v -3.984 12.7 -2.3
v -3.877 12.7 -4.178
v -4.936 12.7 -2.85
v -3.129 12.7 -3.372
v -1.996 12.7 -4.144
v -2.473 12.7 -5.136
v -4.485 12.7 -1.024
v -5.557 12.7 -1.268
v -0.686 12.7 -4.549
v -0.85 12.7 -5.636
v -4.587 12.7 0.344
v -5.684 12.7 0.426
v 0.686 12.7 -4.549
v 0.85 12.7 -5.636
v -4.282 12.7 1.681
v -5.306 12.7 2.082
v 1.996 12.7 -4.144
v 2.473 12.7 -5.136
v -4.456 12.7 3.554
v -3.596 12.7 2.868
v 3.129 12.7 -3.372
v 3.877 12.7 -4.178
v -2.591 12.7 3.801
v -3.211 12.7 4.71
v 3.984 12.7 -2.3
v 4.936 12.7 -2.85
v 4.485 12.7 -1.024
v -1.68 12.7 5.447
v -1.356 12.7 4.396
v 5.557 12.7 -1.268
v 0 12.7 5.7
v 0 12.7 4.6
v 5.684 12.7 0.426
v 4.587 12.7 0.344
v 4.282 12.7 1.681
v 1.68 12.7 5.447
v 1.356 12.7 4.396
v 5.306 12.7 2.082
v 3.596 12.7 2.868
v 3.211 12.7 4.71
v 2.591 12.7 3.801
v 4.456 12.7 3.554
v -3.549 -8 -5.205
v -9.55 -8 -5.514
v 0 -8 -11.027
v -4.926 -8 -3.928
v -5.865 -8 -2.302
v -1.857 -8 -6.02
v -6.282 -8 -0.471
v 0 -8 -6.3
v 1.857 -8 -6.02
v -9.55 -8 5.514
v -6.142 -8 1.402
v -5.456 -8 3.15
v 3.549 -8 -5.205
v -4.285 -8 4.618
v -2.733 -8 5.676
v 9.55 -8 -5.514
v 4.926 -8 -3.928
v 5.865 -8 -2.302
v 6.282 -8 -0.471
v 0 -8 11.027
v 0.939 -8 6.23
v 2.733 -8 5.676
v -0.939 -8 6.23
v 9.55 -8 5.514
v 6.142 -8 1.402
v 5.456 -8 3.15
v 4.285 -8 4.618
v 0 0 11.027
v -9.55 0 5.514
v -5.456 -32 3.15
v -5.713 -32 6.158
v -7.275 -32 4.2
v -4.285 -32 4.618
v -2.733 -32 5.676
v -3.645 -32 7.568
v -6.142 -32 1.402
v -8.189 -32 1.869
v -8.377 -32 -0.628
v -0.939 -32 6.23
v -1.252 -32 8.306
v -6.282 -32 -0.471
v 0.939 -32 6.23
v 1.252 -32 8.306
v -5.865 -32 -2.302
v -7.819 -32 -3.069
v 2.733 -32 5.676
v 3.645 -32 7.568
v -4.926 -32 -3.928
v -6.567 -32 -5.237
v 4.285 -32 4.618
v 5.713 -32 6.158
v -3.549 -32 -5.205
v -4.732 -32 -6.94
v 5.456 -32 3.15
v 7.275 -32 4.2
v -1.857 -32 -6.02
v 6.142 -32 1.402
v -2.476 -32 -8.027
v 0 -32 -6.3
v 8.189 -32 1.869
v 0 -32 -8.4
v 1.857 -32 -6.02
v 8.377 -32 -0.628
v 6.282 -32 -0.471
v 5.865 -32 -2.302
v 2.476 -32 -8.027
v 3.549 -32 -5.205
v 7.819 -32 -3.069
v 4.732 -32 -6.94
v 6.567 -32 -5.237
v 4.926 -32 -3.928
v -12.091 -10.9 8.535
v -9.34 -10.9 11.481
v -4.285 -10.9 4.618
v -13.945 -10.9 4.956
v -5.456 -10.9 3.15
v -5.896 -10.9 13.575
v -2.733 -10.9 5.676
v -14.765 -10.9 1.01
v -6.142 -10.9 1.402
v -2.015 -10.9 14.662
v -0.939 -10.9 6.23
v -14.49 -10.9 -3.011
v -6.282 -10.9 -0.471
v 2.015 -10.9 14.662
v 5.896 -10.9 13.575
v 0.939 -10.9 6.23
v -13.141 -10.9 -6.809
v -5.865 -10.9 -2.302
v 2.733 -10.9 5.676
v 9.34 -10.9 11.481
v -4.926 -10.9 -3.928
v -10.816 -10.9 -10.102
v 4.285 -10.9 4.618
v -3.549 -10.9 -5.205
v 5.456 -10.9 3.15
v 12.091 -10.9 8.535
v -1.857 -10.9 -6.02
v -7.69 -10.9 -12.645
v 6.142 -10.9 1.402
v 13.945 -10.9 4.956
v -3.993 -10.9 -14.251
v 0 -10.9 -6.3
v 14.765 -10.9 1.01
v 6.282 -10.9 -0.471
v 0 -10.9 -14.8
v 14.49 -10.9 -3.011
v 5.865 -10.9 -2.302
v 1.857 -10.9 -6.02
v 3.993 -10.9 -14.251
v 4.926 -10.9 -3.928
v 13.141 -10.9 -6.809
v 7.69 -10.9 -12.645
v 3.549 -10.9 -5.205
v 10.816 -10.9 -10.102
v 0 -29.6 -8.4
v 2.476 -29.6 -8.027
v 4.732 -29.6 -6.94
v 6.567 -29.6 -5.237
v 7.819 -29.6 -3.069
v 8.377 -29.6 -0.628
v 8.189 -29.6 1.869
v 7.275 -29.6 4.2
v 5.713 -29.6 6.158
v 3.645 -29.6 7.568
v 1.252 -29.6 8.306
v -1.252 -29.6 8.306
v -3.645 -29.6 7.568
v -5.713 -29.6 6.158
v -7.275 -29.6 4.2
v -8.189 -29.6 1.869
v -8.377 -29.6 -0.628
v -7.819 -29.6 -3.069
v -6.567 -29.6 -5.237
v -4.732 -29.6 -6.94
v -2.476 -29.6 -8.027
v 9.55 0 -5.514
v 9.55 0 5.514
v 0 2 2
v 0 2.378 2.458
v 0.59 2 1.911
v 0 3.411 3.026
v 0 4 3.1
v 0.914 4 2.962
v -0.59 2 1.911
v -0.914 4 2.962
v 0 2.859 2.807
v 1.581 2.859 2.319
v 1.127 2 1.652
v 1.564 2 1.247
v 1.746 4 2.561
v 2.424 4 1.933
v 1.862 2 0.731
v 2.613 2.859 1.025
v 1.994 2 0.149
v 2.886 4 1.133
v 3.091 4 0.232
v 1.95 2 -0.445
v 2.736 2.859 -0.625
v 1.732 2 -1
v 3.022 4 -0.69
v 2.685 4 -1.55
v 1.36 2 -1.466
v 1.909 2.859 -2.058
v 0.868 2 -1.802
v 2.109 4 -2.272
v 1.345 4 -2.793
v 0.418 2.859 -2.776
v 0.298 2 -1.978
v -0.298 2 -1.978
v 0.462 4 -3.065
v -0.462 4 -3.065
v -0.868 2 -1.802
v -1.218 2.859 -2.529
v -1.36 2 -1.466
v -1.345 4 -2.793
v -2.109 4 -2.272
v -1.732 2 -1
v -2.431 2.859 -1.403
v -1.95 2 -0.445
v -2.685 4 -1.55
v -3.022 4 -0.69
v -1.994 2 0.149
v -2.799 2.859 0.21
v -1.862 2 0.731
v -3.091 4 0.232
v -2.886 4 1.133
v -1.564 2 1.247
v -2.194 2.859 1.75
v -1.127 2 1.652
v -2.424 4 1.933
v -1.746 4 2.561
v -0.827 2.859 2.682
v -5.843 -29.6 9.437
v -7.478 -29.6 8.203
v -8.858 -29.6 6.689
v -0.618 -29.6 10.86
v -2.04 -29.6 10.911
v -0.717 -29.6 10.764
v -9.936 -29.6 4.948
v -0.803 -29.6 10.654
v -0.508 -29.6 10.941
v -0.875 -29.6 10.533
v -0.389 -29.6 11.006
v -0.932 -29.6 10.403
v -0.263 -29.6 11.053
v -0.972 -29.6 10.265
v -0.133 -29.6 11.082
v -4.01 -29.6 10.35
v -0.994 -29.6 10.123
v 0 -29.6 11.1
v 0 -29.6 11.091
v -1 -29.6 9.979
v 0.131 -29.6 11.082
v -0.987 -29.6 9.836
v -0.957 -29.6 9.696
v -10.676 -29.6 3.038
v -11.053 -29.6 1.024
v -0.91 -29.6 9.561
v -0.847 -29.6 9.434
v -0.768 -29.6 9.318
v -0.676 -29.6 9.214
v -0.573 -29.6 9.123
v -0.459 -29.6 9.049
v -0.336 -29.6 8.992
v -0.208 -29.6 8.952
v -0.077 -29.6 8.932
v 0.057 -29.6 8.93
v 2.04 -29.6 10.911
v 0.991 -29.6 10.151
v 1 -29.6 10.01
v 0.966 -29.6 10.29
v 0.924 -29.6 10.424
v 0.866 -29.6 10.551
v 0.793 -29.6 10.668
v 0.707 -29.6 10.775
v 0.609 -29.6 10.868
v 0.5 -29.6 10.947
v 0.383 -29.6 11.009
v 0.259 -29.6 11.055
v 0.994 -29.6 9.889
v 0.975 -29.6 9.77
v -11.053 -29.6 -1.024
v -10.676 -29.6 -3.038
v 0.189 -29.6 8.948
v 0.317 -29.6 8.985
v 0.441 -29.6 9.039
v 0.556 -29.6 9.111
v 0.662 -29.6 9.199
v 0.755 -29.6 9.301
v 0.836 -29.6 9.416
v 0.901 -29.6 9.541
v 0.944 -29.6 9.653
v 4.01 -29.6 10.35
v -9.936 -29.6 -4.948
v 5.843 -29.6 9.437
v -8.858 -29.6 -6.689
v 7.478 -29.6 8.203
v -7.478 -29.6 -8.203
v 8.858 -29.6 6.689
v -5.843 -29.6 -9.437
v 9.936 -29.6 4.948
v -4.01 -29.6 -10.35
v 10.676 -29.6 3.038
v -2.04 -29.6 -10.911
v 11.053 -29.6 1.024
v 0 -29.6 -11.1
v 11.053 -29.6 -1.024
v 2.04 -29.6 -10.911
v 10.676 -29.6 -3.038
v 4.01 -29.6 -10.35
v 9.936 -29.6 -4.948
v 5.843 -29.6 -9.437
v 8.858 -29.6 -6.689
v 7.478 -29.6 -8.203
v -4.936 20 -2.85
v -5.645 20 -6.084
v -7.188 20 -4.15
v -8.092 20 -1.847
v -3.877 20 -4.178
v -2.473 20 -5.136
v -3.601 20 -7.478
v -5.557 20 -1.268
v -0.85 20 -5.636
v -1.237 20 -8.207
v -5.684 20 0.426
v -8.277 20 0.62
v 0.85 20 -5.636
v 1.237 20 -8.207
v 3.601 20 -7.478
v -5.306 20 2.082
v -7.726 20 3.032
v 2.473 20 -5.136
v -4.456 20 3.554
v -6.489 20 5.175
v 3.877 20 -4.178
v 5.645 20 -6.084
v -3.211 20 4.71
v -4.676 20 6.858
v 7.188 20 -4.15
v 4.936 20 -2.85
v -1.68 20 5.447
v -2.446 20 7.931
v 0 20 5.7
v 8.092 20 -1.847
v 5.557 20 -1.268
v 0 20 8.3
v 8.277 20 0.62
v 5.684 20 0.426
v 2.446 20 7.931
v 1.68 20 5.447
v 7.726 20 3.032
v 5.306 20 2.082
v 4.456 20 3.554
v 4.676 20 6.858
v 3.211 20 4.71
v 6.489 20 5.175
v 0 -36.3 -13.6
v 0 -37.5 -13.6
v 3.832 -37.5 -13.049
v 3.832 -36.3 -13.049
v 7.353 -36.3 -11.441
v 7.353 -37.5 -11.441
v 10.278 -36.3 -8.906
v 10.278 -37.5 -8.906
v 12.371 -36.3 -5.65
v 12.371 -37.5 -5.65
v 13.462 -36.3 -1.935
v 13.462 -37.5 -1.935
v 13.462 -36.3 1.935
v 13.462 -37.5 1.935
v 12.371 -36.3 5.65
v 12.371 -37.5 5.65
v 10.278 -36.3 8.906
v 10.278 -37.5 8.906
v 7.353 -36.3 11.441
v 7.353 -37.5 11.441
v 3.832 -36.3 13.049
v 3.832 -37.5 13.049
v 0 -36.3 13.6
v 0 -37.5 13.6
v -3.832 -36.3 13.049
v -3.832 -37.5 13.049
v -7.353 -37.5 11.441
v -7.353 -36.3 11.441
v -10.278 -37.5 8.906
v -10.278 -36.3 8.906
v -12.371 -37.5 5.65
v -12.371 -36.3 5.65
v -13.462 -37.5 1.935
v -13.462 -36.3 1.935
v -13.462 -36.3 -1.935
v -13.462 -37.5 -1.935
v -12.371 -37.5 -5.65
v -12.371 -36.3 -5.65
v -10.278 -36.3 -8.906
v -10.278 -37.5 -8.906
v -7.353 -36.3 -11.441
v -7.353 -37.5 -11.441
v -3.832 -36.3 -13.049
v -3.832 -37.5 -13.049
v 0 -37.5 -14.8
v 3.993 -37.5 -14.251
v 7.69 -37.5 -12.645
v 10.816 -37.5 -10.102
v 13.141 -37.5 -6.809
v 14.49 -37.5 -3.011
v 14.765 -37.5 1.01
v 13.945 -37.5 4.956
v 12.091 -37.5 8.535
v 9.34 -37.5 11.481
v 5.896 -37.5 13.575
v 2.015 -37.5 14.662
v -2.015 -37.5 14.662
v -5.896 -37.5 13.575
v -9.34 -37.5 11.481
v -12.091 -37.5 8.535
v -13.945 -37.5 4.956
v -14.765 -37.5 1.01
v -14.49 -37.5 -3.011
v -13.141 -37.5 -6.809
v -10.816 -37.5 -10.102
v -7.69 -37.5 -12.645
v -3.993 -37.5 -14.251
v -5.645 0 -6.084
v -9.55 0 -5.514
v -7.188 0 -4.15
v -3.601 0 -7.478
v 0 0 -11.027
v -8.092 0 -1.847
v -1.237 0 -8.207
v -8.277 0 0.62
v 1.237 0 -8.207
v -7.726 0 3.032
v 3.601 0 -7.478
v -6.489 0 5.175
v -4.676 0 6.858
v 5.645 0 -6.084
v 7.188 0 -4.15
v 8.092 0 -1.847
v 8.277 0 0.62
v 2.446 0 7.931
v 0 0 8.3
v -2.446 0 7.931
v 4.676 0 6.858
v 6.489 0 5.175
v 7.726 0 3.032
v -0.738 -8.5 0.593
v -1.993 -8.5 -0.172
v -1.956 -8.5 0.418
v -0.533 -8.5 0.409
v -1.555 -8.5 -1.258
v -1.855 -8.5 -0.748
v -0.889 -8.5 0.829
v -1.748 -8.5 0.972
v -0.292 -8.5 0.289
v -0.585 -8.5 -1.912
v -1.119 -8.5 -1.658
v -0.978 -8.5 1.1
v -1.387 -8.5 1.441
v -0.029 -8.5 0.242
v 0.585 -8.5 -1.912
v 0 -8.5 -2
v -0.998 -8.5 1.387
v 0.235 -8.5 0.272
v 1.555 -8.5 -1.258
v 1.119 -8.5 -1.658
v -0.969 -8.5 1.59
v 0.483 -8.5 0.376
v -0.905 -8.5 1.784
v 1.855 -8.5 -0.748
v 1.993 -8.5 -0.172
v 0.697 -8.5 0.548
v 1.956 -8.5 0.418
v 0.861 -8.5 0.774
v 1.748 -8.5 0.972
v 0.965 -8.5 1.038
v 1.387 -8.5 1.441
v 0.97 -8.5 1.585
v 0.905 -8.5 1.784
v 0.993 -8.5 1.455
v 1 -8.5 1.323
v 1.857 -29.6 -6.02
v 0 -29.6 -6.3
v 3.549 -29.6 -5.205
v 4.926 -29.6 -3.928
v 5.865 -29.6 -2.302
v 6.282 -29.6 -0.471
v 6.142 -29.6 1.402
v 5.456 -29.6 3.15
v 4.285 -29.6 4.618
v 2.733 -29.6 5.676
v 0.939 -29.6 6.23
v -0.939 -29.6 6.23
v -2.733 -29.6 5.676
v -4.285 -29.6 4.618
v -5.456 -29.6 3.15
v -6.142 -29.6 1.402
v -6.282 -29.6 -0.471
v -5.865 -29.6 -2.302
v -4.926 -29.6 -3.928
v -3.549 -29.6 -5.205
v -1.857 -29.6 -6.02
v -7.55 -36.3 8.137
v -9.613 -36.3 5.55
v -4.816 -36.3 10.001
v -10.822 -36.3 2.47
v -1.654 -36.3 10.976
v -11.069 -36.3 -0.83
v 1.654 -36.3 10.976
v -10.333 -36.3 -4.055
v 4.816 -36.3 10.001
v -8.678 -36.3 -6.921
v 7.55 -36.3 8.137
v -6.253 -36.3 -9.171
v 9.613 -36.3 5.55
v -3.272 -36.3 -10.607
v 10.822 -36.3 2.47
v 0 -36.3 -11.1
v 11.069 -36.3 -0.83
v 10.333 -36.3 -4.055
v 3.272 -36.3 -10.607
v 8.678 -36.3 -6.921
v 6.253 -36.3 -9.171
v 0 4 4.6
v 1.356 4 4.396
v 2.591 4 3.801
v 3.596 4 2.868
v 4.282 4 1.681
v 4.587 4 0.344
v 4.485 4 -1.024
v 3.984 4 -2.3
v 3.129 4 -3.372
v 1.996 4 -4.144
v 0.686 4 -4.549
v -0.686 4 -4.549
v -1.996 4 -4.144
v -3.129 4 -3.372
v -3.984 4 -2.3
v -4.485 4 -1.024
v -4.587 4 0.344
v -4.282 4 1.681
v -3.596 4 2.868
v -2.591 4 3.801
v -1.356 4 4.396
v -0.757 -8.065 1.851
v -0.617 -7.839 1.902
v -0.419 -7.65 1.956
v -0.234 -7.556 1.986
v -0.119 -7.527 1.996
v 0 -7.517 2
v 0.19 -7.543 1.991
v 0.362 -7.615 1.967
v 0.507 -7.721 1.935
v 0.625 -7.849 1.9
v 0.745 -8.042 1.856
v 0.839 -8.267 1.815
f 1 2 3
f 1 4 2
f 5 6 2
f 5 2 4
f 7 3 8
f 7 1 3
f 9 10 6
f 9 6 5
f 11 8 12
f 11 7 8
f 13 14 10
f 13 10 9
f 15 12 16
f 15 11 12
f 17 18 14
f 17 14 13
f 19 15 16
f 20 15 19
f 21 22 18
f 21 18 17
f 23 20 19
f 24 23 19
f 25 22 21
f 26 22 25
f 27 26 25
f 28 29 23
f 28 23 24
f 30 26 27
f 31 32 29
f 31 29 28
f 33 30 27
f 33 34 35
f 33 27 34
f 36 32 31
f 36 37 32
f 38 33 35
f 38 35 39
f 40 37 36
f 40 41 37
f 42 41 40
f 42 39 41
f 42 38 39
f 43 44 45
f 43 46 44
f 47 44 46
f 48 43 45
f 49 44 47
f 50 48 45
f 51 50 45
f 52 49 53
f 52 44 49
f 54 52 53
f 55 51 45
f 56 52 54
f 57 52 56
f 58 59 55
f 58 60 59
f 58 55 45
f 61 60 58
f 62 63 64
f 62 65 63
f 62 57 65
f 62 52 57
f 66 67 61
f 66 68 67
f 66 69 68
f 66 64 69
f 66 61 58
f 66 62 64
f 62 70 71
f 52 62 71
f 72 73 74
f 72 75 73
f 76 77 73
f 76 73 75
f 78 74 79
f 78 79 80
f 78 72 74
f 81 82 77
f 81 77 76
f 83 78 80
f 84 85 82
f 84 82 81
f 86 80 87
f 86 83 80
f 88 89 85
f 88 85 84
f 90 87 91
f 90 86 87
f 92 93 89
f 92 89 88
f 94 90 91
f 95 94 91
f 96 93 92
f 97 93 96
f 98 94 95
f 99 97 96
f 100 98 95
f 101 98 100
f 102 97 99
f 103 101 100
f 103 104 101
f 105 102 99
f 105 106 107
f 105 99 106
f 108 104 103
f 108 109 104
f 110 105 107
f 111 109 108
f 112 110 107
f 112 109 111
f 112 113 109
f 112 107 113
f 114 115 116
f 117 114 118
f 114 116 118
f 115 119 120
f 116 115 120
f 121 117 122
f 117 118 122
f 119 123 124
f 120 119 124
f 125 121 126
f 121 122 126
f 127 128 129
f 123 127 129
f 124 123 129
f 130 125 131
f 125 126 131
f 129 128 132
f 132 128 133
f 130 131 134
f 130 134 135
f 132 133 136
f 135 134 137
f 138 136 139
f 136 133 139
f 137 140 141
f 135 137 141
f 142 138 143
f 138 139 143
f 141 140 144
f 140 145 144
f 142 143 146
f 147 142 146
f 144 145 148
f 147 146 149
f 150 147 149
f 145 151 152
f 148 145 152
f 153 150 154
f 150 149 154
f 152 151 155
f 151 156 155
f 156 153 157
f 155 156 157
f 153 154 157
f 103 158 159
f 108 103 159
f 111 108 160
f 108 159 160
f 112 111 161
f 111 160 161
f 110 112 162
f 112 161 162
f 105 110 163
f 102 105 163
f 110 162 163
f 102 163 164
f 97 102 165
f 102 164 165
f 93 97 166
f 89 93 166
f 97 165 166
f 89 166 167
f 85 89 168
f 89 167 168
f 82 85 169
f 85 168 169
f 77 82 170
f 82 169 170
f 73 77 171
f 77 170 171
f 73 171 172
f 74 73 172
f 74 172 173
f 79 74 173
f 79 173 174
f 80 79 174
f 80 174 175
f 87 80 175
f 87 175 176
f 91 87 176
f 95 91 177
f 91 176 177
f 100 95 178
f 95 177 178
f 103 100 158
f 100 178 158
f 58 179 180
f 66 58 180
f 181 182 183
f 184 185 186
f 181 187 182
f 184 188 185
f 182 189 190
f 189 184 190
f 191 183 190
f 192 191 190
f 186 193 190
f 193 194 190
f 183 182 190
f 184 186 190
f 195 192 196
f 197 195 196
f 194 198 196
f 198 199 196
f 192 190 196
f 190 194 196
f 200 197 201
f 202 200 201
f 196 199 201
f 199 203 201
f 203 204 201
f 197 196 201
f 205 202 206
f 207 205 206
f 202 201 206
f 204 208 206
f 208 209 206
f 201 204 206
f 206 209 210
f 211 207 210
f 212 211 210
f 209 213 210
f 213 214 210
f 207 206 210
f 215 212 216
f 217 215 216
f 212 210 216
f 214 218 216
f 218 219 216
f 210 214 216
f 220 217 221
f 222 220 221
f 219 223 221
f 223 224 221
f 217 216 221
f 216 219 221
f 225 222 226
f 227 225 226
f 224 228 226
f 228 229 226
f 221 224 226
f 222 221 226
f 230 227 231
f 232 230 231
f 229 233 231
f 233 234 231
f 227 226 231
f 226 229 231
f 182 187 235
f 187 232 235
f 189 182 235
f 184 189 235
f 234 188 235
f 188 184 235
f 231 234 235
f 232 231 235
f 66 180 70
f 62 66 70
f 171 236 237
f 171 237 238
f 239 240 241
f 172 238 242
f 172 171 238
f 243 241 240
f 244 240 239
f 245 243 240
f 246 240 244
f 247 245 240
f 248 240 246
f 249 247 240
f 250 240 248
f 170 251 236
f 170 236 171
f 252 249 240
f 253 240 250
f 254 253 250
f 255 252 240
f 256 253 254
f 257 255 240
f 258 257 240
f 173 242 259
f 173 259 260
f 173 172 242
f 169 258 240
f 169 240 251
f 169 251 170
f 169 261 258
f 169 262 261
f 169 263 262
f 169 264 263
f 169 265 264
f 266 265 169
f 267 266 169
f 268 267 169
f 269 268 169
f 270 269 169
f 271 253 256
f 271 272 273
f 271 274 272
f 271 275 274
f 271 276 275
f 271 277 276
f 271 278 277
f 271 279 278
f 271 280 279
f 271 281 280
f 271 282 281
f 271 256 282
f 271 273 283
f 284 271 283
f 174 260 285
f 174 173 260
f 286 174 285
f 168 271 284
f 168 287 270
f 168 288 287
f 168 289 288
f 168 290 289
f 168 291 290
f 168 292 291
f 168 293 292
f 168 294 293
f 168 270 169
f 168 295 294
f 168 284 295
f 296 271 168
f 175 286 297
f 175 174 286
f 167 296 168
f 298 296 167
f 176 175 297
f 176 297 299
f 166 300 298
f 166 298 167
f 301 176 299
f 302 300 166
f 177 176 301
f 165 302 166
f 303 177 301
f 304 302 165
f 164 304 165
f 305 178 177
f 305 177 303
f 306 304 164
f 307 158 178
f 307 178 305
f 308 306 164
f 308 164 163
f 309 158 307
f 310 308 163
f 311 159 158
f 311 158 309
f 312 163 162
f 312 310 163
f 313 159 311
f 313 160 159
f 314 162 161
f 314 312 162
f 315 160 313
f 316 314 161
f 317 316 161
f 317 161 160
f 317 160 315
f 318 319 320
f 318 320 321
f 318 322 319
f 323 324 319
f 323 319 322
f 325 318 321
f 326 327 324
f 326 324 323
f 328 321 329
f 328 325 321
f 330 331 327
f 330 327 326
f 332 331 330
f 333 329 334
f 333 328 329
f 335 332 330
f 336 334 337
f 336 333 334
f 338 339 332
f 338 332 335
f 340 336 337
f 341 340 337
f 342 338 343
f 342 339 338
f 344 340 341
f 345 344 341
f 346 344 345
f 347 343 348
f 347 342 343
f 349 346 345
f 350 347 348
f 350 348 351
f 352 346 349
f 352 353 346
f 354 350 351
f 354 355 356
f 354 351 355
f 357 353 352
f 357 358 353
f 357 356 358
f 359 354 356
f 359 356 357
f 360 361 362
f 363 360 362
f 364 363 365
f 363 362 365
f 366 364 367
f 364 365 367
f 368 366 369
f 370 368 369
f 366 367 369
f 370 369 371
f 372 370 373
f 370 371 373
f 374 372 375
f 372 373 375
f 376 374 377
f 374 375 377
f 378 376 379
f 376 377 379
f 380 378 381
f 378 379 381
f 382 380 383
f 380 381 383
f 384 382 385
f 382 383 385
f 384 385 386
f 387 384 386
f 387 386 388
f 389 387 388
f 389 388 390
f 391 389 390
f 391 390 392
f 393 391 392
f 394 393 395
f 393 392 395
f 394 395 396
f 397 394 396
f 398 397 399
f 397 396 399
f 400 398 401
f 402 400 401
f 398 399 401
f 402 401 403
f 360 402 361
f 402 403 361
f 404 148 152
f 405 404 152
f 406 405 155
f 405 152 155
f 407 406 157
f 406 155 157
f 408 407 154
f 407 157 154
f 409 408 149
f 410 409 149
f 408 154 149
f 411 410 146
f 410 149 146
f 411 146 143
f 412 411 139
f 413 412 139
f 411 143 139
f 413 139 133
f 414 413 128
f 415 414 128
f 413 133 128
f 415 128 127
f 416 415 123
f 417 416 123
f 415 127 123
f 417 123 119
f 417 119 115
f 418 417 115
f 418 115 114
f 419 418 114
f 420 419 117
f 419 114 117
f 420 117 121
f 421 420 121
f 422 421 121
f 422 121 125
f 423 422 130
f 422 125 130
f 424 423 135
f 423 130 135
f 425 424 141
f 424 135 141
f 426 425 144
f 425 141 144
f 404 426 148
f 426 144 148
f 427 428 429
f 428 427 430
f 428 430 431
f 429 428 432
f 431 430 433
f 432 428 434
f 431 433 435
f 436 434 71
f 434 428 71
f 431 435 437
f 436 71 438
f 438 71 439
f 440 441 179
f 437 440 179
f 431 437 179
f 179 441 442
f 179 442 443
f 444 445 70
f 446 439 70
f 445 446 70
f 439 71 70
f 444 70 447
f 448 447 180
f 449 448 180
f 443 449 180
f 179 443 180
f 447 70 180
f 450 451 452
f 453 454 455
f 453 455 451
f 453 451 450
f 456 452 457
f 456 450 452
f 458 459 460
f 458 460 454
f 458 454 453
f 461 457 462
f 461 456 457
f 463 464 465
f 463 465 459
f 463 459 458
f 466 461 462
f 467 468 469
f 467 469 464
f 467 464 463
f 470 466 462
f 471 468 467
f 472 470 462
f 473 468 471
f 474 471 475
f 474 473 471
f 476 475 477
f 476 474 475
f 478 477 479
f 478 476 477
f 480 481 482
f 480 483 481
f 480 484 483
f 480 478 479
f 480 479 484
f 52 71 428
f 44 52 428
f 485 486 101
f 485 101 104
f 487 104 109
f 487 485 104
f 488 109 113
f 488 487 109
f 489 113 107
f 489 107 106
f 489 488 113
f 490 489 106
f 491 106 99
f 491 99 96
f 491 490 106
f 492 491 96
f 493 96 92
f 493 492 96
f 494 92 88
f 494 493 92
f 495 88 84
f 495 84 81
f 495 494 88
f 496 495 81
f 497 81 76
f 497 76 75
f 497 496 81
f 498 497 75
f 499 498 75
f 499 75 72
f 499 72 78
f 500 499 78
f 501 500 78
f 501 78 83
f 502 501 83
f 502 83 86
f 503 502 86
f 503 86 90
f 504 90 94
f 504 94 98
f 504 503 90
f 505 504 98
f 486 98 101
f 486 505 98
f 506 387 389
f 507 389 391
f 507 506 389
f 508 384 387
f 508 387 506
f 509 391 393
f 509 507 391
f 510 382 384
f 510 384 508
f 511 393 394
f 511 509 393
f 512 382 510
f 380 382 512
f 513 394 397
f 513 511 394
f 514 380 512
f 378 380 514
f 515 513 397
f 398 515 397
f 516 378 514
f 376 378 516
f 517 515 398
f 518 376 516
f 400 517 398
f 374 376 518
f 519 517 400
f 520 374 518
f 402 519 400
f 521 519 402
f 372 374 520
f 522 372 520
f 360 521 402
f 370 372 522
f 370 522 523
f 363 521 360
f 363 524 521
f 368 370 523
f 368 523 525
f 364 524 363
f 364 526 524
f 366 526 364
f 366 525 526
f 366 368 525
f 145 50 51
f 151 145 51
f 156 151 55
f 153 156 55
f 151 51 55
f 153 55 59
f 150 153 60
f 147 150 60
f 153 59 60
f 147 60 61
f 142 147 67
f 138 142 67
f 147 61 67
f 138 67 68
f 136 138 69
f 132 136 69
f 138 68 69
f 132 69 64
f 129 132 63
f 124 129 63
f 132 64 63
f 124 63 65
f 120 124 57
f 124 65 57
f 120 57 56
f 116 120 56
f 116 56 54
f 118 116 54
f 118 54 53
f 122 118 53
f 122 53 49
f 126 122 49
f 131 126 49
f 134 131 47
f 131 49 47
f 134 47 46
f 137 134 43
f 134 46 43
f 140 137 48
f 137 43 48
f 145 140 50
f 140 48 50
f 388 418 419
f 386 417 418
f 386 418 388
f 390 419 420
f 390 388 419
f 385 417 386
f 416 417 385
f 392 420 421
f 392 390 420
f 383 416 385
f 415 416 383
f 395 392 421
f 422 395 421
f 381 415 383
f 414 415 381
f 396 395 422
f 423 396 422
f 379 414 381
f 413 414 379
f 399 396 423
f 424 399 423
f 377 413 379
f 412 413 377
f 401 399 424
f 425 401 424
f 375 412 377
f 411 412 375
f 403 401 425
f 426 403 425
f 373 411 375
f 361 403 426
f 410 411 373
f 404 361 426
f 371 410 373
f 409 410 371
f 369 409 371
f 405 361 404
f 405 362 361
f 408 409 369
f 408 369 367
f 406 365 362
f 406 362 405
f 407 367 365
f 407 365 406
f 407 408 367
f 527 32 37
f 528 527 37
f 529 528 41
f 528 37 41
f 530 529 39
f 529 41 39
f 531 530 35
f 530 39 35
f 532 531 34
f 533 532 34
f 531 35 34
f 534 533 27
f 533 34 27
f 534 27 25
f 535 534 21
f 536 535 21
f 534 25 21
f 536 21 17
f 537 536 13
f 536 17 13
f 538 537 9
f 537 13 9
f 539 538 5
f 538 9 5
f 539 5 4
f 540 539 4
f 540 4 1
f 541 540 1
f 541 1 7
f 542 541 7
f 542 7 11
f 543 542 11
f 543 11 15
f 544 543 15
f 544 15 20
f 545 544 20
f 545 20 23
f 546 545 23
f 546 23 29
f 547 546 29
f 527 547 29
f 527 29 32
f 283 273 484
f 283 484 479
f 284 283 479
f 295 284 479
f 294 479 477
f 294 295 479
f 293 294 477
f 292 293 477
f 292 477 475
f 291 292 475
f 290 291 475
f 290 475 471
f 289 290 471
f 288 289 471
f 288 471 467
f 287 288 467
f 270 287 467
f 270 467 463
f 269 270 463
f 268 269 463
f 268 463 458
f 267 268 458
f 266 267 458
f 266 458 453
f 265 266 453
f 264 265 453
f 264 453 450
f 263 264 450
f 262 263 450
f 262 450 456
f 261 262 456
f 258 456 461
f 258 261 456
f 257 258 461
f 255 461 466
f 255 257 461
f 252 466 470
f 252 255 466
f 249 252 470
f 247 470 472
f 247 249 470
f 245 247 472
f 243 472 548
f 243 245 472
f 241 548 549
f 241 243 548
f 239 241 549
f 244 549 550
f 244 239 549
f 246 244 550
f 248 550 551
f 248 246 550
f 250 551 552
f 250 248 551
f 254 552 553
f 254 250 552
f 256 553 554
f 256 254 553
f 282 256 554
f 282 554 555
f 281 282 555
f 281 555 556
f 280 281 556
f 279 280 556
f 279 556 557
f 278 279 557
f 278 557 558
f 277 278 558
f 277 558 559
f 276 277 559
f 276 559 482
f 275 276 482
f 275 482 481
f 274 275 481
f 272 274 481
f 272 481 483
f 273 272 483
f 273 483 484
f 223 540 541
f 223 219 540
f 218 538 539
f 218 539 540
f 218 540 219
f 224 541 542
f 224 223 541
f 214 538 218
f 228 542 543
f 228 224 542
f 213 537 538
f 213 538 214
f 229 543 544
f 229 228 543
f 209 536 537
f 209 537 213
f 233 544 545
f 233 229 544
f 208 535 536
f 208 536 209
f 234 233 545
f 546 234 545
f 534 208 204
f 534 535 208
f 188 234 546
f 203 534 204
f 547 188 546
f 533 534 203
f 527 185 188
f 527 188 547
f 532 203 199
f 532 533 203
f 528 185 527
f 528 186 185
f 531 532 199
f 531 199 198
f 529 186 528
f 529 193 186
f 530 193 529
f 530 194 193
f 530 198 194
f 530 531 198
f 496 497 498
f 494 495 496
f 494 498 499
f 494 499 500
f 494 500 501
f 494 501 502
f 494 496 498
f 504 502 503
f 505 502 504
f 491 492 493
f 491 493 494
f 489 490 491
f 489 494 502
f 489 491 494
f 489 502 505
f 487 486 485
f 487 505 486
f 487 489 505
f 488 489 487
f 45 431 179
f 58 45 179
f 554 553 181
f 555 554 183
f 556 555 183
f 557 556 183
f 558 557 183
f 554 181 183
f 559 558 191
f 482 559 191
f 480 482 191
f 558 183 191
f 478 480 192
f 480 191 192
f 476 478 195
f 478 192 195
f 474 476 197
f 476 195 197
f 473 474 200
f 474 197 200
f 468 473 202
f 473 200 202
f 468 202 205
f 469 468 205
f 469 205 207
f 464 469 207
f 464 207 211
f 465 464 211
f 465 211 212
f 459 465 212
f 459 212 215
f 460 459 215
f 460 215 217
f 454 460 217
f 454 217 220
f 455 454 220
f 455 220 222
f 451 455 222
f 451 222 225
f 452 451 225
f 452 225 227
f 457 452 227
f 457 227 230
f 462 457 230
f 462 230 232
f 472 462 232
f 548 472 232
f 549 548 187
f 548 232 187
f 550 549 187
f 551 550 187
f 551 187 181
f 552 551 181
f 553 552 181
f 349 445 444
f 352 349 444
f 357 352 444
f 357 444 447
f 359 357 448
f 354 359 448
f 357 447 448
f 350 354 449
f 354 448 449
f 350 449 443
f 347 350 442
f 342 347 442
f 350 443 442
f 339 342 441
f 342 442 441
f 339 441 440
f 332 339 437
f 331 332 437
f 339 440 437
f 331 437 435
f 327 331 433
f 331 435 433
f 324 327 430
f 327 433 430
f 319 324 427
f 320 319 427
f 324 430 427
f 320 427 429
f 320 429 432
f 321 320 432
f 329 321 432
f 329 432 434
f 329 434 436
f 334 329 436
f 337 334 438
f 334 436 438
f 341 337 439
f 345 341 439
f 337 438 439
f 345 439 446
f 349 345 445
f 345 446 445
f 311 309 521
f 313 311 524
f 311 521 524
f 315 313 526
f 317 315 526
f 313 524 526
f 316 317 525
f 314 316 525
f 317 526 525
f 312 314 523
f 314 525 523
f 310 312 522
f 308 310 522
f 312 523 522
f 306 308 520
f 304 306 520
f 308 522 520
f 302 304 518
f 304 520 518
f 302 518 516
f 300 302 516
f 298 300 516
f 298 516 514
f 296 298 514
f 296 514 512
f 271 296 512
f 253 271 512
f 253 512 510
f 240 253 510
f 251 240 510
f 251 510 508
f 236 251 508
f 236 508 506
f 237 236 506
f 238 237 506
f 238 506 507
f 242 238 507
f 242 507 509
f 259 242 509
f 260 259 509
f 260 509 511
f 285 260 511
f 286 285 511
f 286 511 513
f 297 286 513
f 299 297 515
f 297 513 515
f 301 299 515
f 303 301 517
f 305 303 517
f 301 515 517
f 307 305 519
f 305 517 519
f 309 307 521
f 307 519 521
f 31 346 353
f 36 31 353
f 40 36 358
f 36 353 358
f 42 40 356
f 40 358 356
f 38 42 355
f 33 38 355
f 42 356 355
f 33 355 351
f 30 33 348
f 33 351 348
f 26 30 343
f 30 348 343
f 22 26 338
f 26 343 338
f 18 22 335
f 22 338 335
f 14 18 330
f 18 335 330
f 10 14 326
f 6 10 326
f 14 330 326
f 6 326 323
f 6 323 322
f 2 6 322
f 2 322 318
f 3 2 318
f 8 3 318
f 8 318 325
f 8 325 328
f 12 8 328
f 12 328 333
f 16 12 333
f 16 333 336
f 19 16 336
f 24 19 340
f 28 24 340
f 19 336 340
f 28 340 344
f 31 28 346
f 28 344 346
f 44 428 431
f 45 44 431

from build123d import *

# Parameters (mm, degrees)
SKETCH1_R            = 8.3
BOSS_EXTRUDE1_DEPTH  = 20
BOSS_EXTRUDE2_DEPTH  = 8
SKETCH3_R            = 4.6
CUT_EXTRUDE1_DEPTH   = 16
SKETCH4_R            = 5.7
CUT_EXTRUDE2_DEPTH   = 7.3
SKETCH5_R            = 3.1
CUT_EXTRUDE3_DEPTH   = 2
SKETCH7_R            = 6.3
BOSS_EXTRUDE3_DEPTH  = 2.9
SKETCH6_R            = 2
CUT_EXTRUDE4_DEPTH   = 10.5
FILLET1_R            = 2.368
SKETCH9_R            = 14.8
BOSS_EXTRUDE5_DEPTH  = 26.6
SKETCH10_R           = 11.1
CUT_EXTRUDE5_DEPTH   = 7.9
SKETCH11_R           = 13.6
CUT_EXTRUDE6_DEPTH   = 1.2
SKETCH12_R           = 8.4
SKETCH12_R_2         = 6.3
BOSS_EXTRUDE6_DEPTH  = 2.4
CUT_SWEEP2_START     = -31.593597178
CUT_SWEEP2_OUTLINE_R = 1
CUT_SWEEP2_DEPTH     = 24.495000761


with BuildPart() as part:
    # Sketch1 → Boss-Extrude1 (new body)
    with BuildSketch(Plane(origin=(0, 0, 0), x_dir=(1, 0, 0), z_dir=(0, 1, 0))):
        with Locations(Location((0, 0, 0), (0, 0, 270))):
            Circle(SKETCH1_R)
    extrude(amount=BOSS_EXTRUDE1_DEPTH)

    # Sketch2 → Boss-Extrude2 (add)
    with BuildSketch(Plane.XZ):
        Polygon((0, 11.027390142), (-9.55, 5.513695071), (-9.55, -5.513695071), (0, -11.027390142), (9.55, -5.513695071), (9.55, 5.513695071), align=None)
    extrude(amount=BOSS_EXTRUDE2_DEPTH)

    # Sketch3 → Cut-Extrude1 (cut)
    with BuildSketch(Plane(origin=(0, 20, 0), x_dir=(1, 0, 0), z_dir=(0, 1, 0))):
        with Locations(Location((0, 0, 0), (0, 0, 270))):
            Circle(SKETCH3_R)
    extrude(amount=-CUT_EXTRUDE1_DEPTH, mode=Mode.SUBTRACT)

    # Sketch4 → Cut-Extrude2 (cut)
    with BuildSketch(Plane(origin=(0, 20, 0), x_dir=(1, 0, 0), z_dir=(0, 1, 0))):
        with Locations(Location((0, 0, 0), (0, 0, 270))):
            Circle(SKETCH4_R)
    extrude(amount=-CUT_EXTRUDE2_DEPTH, mode=Mode.SUBTRACT)

    # Sketch5 → Cut-Extrude3 (cut)
    with BuildSketch(Plane(origin=(0, 4, 0), x_dir=(1, 0, 0), z_dir=(0, 1, 0))):
        with Locations(Location((0, 0, 0), (0, 0, 270))):
            Circle(SKETCH5_R)
    extrude(amount=-CUT_EXTRUDE3_DEPTH, mode=Mode.SUBTRACT)

    # Sketch7 → Boss-Extrude3 (add)
    with BuildSketch(Plane.XZ.offset(8)):
        with Locations(Location((0, 0, 0), (0, 0, 270))):
            Circle(SKETCH7_R)
    extrude(amount=BOSS_EXTRUDE3_DEPTH)

    # Sketch6 → Cut-Extrude4 (cut)
    with BuildSketch(Plane(origin=(0, 2, 0), x_dir=(1, 0, 0), z_dir=(0, 1, 0))):
        with Locations(Location((0, 0, 0), (0, 0, 270))):
            Circle(SKETCH6_R)
    extrude(amount=-CUT_EXTRUDE4_DEPTH, mode=Mode.SUBTRACT)

    # Fillet1
    # the kernel refuses this fillet: 2.368 mm, written as the material it adds along each edge
    with BuildSketch(Plane(origin=(0, 2, 0), x_dir=(0, 0, 1), z_dir=(-1, 0, 0))) as fillet1_piece_1:
        with BuildLine():
            CenterArc((0.732, 1.999899998), FILLET1_R, 302.375992961, 57.624007039)
            Line((2, 0), (3.1, 0))
            Line((3.1, 0), (3.1, 1.999899998))
        make_face()
    revolve(axis=Axis((0, 2, 0), (0, 1, 0)))

    # Sketch9 → Boss-Extrude5 (add)
    with BuildSketch(Plane.XZ.offset(10.9)):
        with Locations(Location((0, 0, 0), (0, 0, 270))):
            Circle(SKETCH9_R)
    extrude(amount=BOSS_EXTRUDE5_DEPTH)

    # Sketch10 → Cut-Extrude5 (cut)
    with BuildSketch(Plane.XZ.offset(37.5)):
        with Locations(Location((0, 0, 0), (0, 0, 270))):
            Circle(SKETCH10_R)
    extrude(amount=-CUT_EXTRUDE5_DEPTH, mode=Mode.SUBTRACT)

    # Sketch11 → Cut-Extrude6 (cut)
    with BuildSketch(Plane.XZ.offset(37.5)):
        with Locations(Location((0, 0, 0), (0, 0, 270))):
            Circle(SKETCH11_R)
    extrude(amount=-CUT_EXTRUDE6_DEPTH, mode=Mode.SUBTRACT)

    # Sketch12 → Boss-Extrude6 (add)
    with BuildSketch(Plane.XZ.offset(29.6)):
        with Locations(Location((0, 0, 0), (0, 0, 270))):
            Circle(SKETCH12_R)
        with Locations(Location((0, 0, 0), (0, 0, 270))):
            Circle(SKETCH12_R_2, mode=Mode.SUBTRACT)
    extrude(amount=BOSS_EXTRUDE6_DEPTH)

    # Cut-Sweep2: read off the stored shape, not the designer's step
    # Cut-Sweep2 outline → Cut-Sweep2 (cut)
    with BuildSketch(Plane(origin=(0, 0, 0), x_dir=(1, 0, 0), z_dir=(0, 0.9247029674801356, -0.38068940349506886)).offset(CUT_SWEEP2_START)):
        with Locations((0, 2.012129639)):
            Circle(CUT_SWEEP2_OUTLINE_R)
    extrude(amount=CUT_SWEEP2_DEPTH, mode=Mode.SUBTRACT)


solid = part.part
